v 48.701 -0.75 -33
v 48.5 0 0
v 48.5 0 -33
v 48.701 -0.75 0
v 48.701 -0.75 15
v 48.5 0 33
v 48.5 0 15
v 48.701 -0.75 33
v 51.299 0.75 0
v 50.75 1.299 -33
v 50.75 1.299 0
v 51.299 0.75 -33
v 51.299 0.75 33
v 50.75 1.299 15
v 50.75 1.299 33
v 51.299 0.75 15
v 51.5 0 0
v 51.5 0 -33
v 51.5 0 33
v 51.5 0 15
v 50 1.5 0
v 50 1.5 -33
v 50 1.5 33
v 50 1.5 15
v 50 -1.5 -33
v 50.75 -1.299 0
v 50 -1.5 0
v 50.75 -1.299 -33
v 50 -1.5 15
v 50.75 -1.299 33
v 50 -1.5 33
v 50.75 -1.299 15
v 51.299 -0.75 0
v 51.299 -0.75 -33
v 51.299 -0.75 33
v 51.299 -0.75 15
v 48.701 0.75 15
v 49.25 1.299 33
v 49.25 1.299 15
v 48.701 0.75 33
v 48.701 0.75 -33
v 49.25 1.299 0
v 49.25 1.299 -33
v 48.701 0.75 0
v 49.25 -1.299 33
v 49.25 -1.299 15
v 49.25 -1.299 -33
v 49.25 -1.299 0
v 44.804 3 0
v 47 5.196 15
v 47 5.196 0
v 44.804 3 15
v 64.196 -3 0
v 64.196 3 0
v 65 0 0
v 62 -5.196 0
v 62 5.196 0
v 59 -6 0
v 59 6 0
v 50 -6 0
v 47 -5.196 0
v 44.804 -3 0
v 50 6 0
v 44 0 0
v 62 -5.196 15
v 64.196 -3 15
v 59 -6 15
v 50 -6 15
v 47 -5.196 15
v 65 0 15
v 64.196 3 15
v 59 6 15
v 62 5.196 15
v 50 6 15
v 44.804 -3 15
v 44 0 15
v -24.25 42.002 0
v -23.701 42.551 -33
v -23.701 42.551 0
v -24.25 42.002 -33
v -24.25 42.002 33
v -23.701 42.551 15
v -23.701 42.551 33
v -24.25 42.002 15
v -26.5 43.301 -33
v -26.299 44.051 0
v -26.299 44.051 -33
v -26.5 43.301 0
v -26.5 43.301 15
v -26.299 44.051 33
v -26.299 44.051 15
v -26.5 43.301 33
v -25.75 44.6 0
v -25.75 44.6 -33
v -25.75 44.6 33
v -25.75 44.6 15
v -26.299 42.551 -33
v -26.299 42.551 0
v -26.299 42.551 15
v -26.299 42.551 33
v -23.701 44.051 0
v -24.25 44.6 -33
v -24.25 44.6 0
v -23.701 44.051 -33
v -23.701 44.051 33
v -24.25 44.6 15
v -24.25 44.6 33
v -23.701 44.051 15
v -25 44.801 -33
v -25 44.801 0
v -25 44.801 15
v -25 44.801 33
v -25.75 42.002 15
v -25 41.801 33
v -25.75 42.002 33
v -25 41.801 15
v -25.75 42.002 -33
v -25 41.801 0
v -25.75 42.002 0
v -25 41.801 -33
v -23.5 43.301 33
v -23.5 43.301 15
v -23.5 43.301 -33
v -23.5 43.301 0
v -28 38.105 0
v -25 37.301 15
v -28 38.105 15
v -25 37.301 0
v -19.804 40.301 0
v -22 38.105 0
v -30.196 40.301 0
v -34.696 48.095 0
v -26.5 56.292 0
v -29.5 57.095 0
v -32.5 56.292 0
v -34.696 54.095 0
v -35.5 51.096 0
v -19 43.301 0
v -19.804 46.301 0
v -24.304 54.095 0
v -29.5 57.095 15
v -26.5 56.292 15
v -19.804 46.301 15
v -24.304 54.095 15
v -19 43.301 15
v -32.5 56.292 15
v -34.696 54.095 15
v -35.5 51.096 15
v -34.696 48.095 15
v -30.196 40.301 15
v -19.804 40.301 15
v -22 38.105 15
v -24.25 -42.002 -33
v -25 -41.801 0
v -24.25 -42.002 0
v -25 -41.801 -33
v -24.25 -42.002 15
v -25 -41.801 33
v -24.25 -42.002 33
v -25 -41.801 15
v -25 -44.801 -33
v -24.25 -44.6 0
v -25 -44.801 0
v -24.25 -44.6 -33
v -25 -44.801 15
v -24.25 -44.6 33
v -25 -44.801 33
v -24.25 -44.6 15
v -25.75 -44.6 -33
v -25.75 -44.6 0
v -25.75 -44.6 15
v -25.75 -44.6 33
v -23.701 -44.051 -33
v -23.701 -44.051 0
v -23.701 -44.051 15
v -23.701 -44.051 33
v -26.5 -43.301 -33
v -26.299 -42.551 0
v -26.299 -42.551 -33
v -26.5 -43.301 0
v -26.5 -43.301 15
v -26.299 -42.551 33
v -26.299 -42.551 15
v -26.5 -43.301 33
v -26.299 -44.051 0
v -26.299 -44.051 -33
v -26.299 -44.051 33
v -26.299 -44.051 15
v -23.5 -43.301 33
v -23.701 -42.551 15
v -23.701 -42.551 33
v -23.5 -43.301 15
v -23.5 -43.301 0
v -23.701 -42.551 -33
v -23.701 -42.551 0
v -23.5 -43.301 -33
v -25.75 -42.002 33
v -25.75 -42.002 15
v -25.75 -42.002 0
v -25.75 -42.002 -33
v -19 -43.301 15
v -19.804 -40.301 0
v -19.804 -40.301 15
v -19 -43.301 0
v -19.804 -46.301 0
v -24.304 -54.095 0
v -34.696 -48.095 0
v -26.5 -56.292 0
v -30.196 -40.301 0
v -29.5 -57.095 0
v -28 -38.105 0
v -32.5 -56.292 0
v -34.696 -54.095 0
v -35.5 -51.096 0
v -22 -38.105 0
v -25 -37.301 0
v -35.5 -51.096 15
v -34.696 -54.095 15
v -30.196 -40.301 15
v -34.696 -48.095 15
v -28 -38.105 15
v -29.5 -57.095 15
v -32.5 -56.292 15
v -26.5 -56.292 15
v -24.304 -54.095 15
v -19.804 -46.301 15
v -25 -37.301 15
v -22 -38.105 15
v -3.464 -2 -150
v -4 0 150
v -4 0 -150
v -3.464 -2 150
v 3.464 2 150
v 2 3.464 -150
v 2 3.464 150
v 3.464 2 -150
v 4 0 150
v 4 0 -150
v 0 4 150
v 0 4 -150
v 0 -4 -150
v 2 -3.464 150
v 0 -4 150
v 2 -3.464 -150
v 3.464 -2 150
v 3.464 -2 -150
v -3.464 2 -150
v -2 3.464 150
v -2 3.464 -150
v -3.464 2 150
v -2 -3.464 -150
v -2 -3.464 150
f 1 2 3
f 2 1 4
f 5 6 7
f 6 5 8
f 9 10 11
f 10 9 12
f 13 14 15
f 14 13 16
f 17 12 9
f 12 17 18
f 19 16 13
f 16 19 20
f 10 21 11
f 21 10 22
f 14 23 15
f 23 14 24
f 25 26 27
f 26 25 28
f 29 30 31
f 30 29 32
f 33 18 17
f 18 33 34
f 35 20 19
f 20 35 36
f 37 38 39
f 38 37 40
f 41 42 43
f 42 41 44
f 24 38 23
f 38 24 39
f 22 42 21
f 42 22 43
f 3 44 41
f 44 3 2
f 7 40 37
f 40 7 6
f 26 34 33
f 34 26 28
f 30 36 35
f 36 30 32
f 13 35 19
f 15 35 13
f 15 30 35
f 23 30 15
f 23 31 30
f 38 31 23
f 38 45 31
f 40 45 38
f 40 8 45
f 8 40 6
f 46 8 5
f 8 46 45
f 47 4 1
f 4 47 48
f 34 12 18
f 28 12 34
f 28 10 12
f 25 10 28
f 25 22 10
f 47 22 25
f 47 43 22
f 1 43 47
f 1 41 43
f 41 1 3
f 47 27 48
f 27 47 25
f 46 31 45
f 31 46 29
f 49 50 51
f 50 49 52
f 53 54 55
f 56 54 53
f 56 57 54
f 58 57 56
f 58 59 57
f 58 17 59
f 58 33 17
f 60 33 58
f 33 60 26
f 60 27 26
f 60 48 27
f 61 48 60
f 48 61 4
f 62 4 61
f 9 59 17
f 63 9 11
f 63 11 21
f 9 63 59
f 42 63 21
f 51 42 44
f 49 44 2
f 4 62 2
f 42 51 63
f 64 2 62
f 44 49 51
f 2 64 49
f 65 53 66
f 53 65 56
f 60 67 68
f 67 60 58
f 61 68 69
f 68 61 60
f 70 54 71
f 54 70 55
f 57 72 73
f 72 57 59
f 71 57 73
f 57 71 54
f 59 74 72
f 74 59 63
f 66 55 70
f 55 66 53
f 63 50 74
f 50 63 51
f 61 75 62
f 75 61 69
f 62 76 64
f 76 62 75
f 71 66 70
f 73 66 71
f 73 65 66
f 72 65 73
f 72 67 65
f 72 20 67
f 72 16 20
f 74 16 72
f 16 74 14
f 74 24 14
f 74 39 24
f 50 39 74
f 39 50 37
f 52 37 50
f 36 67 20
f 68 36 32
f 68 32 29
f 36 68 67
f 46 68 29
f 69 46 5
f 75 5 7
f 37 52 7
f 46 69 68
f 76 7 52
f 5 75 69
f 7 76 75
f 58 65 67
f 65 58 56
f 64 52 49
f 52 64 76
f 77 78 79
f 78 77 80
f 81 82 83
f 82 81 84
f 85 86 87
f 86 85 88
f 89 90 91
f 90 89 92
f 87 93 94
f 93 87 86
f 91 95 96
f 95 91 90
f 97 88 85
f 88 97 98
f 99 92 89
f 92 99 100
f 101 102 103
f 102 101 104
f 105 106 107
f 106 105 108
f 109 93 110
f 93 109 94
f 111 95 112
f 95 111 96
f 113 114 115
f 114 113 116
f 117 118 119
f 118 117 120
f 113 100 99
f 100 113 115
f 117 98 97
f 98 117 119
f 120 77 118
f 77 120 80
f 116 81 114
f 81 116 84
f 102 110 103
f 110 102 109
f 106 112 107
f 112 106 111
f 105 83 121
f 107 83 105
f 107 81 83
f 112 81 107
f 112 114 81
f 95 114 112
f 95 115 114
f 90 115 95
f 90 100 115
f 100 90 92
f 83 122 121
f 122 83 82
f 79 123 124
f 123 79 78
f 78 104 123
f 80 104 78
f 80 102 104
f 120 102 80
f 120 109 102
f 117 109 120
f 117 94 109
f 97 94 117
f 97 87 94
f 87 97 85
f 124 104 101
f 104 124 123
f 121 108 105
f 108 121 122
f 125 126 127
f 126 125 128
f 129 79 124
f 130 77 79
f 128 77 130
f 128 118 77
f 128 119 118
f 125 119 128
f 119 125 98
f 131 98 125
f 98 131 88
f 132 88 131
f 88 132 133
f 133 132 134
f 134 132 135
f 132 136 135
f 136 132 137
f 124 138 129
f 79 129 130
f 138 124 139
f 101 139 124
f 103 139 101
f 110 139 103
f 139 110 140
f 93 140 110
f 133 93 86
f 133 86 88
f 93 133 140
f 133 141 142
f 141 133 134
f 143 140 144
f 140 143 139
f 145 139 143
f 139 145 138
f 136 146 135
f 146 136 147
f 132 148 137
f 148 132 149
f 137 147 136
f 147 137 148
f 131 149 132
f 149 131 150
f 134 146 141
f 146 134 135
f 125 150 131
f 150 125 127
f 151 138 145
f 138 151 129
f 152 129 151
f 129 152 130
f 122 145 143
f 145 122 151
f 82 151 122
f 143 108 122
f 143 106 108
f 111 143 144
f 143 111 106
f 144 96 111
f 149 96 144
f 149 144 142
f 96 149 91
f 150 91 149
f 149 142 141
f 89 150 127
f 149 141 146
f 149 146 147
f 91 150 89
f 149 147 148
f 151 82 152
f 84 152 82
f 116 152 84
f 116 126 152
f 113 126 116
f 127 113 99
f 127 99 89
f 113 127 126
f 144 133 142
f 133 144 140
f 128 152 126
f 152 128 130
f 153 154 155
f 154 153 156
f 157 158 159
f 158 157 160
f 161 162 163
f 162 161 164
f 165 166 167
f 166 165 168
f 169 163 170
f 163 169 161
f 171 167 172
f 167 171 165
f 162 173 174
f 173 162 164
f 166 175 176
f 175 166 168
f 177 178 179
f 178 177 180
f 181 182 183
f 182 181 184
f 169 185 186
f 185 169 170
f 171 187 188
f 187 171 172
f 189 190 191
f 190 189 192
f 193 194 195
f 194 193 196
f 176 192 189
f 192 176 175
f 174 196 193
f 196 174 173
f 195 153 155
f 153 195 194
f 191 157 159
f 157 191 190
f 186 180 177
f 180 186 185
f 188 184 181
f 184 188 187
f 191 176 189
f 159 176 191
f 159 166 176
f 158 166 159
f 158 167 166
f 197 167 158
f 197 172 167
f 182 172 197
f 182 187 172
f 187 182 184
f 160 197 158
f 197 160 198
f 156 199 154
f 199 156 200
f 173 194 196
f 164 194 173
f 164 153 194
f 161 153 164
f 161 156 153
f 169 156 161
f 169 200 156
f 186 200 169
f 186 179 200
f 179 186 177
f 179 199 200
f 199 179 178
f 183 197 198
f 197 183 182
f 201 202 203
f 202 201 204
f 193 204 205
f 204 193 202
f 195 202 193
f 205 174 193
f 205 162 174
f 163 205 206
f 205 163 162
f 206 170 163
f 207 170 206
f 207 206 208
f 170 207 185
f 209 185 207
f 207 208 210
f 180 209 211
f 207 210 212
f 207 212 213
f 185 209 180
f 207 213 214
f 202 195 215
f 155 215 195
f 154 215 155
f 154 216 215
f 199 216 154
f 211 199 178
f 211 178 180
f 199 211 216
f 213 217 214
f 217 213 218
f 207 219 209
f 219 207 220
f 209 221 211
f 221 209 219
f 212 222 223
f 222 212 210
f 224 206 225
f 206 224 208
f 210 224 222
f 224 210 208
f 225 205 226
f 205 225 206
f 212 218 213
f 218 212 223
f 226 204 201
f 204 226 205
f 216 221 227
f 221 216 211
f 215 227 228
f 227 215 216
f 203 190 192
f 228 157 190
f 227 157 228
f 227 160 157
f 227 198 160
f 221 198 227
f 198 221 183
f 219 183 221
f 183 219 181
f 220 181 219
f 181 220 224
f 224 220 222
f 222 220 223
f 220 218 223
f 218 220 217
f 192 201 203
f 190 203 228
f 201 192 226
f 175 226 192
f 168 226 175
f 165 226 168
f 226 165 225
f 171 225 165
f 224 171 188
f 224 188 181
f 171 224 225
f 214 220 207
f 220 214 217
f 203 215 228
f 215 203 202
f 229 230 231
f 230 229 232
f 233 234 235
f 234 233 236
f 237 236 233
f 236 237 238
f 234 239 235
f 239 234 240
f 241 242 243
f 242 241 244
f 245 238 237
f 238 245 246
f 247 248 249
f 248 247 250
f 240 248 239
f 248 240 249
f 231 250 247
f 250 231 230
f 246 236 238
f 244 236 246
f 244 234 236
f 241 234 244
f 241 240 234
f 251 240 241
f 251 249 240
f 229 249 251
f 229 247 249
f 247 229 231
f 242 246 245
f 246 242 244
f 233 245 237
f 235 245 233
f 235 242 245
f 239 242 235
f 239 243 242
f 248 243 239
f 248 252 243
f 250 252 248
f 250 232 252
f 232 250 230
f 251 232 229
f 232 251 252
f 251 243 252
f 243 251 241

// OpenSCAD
NoA=3;

// Bohrungen ====================================

DACO=8;     //Diameter Axis Cut Out
DScDAS=3;   //Diameter Screw Disc Attach Star
DScDASHAD=DScDAS*4;// Diameter Screw Head Disc Attach Star
DoBearFit=22;	//Diameter of Bearing

Pos_X=0;
Pos_Y=0;
Pos_Z=0;

// Dimensions ====================================

HoDAS=15;   //Height of DiscAttachStar

AHDC=100; // Atach Hole Diameter Circle

//AxisCutOut();

// Helping Parameters ====================================

MFN=12; // Main Faccette Number

// ====================================

AxisCutOut(Pos_X,Pos_Y,Pos_Z,DACO);
AttachScrews(NoA,AHDC);

module AxisCutOut(Pos_X,Pos_Y,Pos_Z,DACO){
	translate([Pos_X,Pos_Y,Pos_Z]){
		cylinder(h=HoDAS*20,d1=DACO,d2=DACO,center=true,$fn=MFN);
	}
}

module AttachScrews(NoA,AHDC){
AbArm=360/NoA;  // Angle between Arms
     for(i=[0:AbArm:360]){
        rotate([0,0,i]){
            translate([AHDC/2,0,0]){
                cylinder(66,d1=DScDAS,d2=DScDAS,center=true,$fn=MFN);
				AttachScrewsRest();				
/*				translate([0,0,HoDAS/2.3]){
					hull(){
						cylinder(HoDAS,d1=DScDAS*3,d2=DScDAS*3,center=true,$fn=MFN);
						translate([DScDAS*3,0,0]){
							cylinder(HoDAS,d1=DScDAS*3,d2=DScDAS*3,center=true,$fn=MFN);
						}
					}
				}*/
            }
         }
     }
 }
 
module AttachScrewsRest(){
translate([0,0,HoDAS/2]){
	hull(){
		cylinder(HoDAS,d1=DScDASHAD,d2=DScDASHAD,center=true,$fn=MFN);
			translate([DScDAS*3,0,0]){
				cylinder(HoDAS,d1=DScDASHAD,d2=DScDASHAD,center=true,$fn=MFN);
			}
		}
	}
}
